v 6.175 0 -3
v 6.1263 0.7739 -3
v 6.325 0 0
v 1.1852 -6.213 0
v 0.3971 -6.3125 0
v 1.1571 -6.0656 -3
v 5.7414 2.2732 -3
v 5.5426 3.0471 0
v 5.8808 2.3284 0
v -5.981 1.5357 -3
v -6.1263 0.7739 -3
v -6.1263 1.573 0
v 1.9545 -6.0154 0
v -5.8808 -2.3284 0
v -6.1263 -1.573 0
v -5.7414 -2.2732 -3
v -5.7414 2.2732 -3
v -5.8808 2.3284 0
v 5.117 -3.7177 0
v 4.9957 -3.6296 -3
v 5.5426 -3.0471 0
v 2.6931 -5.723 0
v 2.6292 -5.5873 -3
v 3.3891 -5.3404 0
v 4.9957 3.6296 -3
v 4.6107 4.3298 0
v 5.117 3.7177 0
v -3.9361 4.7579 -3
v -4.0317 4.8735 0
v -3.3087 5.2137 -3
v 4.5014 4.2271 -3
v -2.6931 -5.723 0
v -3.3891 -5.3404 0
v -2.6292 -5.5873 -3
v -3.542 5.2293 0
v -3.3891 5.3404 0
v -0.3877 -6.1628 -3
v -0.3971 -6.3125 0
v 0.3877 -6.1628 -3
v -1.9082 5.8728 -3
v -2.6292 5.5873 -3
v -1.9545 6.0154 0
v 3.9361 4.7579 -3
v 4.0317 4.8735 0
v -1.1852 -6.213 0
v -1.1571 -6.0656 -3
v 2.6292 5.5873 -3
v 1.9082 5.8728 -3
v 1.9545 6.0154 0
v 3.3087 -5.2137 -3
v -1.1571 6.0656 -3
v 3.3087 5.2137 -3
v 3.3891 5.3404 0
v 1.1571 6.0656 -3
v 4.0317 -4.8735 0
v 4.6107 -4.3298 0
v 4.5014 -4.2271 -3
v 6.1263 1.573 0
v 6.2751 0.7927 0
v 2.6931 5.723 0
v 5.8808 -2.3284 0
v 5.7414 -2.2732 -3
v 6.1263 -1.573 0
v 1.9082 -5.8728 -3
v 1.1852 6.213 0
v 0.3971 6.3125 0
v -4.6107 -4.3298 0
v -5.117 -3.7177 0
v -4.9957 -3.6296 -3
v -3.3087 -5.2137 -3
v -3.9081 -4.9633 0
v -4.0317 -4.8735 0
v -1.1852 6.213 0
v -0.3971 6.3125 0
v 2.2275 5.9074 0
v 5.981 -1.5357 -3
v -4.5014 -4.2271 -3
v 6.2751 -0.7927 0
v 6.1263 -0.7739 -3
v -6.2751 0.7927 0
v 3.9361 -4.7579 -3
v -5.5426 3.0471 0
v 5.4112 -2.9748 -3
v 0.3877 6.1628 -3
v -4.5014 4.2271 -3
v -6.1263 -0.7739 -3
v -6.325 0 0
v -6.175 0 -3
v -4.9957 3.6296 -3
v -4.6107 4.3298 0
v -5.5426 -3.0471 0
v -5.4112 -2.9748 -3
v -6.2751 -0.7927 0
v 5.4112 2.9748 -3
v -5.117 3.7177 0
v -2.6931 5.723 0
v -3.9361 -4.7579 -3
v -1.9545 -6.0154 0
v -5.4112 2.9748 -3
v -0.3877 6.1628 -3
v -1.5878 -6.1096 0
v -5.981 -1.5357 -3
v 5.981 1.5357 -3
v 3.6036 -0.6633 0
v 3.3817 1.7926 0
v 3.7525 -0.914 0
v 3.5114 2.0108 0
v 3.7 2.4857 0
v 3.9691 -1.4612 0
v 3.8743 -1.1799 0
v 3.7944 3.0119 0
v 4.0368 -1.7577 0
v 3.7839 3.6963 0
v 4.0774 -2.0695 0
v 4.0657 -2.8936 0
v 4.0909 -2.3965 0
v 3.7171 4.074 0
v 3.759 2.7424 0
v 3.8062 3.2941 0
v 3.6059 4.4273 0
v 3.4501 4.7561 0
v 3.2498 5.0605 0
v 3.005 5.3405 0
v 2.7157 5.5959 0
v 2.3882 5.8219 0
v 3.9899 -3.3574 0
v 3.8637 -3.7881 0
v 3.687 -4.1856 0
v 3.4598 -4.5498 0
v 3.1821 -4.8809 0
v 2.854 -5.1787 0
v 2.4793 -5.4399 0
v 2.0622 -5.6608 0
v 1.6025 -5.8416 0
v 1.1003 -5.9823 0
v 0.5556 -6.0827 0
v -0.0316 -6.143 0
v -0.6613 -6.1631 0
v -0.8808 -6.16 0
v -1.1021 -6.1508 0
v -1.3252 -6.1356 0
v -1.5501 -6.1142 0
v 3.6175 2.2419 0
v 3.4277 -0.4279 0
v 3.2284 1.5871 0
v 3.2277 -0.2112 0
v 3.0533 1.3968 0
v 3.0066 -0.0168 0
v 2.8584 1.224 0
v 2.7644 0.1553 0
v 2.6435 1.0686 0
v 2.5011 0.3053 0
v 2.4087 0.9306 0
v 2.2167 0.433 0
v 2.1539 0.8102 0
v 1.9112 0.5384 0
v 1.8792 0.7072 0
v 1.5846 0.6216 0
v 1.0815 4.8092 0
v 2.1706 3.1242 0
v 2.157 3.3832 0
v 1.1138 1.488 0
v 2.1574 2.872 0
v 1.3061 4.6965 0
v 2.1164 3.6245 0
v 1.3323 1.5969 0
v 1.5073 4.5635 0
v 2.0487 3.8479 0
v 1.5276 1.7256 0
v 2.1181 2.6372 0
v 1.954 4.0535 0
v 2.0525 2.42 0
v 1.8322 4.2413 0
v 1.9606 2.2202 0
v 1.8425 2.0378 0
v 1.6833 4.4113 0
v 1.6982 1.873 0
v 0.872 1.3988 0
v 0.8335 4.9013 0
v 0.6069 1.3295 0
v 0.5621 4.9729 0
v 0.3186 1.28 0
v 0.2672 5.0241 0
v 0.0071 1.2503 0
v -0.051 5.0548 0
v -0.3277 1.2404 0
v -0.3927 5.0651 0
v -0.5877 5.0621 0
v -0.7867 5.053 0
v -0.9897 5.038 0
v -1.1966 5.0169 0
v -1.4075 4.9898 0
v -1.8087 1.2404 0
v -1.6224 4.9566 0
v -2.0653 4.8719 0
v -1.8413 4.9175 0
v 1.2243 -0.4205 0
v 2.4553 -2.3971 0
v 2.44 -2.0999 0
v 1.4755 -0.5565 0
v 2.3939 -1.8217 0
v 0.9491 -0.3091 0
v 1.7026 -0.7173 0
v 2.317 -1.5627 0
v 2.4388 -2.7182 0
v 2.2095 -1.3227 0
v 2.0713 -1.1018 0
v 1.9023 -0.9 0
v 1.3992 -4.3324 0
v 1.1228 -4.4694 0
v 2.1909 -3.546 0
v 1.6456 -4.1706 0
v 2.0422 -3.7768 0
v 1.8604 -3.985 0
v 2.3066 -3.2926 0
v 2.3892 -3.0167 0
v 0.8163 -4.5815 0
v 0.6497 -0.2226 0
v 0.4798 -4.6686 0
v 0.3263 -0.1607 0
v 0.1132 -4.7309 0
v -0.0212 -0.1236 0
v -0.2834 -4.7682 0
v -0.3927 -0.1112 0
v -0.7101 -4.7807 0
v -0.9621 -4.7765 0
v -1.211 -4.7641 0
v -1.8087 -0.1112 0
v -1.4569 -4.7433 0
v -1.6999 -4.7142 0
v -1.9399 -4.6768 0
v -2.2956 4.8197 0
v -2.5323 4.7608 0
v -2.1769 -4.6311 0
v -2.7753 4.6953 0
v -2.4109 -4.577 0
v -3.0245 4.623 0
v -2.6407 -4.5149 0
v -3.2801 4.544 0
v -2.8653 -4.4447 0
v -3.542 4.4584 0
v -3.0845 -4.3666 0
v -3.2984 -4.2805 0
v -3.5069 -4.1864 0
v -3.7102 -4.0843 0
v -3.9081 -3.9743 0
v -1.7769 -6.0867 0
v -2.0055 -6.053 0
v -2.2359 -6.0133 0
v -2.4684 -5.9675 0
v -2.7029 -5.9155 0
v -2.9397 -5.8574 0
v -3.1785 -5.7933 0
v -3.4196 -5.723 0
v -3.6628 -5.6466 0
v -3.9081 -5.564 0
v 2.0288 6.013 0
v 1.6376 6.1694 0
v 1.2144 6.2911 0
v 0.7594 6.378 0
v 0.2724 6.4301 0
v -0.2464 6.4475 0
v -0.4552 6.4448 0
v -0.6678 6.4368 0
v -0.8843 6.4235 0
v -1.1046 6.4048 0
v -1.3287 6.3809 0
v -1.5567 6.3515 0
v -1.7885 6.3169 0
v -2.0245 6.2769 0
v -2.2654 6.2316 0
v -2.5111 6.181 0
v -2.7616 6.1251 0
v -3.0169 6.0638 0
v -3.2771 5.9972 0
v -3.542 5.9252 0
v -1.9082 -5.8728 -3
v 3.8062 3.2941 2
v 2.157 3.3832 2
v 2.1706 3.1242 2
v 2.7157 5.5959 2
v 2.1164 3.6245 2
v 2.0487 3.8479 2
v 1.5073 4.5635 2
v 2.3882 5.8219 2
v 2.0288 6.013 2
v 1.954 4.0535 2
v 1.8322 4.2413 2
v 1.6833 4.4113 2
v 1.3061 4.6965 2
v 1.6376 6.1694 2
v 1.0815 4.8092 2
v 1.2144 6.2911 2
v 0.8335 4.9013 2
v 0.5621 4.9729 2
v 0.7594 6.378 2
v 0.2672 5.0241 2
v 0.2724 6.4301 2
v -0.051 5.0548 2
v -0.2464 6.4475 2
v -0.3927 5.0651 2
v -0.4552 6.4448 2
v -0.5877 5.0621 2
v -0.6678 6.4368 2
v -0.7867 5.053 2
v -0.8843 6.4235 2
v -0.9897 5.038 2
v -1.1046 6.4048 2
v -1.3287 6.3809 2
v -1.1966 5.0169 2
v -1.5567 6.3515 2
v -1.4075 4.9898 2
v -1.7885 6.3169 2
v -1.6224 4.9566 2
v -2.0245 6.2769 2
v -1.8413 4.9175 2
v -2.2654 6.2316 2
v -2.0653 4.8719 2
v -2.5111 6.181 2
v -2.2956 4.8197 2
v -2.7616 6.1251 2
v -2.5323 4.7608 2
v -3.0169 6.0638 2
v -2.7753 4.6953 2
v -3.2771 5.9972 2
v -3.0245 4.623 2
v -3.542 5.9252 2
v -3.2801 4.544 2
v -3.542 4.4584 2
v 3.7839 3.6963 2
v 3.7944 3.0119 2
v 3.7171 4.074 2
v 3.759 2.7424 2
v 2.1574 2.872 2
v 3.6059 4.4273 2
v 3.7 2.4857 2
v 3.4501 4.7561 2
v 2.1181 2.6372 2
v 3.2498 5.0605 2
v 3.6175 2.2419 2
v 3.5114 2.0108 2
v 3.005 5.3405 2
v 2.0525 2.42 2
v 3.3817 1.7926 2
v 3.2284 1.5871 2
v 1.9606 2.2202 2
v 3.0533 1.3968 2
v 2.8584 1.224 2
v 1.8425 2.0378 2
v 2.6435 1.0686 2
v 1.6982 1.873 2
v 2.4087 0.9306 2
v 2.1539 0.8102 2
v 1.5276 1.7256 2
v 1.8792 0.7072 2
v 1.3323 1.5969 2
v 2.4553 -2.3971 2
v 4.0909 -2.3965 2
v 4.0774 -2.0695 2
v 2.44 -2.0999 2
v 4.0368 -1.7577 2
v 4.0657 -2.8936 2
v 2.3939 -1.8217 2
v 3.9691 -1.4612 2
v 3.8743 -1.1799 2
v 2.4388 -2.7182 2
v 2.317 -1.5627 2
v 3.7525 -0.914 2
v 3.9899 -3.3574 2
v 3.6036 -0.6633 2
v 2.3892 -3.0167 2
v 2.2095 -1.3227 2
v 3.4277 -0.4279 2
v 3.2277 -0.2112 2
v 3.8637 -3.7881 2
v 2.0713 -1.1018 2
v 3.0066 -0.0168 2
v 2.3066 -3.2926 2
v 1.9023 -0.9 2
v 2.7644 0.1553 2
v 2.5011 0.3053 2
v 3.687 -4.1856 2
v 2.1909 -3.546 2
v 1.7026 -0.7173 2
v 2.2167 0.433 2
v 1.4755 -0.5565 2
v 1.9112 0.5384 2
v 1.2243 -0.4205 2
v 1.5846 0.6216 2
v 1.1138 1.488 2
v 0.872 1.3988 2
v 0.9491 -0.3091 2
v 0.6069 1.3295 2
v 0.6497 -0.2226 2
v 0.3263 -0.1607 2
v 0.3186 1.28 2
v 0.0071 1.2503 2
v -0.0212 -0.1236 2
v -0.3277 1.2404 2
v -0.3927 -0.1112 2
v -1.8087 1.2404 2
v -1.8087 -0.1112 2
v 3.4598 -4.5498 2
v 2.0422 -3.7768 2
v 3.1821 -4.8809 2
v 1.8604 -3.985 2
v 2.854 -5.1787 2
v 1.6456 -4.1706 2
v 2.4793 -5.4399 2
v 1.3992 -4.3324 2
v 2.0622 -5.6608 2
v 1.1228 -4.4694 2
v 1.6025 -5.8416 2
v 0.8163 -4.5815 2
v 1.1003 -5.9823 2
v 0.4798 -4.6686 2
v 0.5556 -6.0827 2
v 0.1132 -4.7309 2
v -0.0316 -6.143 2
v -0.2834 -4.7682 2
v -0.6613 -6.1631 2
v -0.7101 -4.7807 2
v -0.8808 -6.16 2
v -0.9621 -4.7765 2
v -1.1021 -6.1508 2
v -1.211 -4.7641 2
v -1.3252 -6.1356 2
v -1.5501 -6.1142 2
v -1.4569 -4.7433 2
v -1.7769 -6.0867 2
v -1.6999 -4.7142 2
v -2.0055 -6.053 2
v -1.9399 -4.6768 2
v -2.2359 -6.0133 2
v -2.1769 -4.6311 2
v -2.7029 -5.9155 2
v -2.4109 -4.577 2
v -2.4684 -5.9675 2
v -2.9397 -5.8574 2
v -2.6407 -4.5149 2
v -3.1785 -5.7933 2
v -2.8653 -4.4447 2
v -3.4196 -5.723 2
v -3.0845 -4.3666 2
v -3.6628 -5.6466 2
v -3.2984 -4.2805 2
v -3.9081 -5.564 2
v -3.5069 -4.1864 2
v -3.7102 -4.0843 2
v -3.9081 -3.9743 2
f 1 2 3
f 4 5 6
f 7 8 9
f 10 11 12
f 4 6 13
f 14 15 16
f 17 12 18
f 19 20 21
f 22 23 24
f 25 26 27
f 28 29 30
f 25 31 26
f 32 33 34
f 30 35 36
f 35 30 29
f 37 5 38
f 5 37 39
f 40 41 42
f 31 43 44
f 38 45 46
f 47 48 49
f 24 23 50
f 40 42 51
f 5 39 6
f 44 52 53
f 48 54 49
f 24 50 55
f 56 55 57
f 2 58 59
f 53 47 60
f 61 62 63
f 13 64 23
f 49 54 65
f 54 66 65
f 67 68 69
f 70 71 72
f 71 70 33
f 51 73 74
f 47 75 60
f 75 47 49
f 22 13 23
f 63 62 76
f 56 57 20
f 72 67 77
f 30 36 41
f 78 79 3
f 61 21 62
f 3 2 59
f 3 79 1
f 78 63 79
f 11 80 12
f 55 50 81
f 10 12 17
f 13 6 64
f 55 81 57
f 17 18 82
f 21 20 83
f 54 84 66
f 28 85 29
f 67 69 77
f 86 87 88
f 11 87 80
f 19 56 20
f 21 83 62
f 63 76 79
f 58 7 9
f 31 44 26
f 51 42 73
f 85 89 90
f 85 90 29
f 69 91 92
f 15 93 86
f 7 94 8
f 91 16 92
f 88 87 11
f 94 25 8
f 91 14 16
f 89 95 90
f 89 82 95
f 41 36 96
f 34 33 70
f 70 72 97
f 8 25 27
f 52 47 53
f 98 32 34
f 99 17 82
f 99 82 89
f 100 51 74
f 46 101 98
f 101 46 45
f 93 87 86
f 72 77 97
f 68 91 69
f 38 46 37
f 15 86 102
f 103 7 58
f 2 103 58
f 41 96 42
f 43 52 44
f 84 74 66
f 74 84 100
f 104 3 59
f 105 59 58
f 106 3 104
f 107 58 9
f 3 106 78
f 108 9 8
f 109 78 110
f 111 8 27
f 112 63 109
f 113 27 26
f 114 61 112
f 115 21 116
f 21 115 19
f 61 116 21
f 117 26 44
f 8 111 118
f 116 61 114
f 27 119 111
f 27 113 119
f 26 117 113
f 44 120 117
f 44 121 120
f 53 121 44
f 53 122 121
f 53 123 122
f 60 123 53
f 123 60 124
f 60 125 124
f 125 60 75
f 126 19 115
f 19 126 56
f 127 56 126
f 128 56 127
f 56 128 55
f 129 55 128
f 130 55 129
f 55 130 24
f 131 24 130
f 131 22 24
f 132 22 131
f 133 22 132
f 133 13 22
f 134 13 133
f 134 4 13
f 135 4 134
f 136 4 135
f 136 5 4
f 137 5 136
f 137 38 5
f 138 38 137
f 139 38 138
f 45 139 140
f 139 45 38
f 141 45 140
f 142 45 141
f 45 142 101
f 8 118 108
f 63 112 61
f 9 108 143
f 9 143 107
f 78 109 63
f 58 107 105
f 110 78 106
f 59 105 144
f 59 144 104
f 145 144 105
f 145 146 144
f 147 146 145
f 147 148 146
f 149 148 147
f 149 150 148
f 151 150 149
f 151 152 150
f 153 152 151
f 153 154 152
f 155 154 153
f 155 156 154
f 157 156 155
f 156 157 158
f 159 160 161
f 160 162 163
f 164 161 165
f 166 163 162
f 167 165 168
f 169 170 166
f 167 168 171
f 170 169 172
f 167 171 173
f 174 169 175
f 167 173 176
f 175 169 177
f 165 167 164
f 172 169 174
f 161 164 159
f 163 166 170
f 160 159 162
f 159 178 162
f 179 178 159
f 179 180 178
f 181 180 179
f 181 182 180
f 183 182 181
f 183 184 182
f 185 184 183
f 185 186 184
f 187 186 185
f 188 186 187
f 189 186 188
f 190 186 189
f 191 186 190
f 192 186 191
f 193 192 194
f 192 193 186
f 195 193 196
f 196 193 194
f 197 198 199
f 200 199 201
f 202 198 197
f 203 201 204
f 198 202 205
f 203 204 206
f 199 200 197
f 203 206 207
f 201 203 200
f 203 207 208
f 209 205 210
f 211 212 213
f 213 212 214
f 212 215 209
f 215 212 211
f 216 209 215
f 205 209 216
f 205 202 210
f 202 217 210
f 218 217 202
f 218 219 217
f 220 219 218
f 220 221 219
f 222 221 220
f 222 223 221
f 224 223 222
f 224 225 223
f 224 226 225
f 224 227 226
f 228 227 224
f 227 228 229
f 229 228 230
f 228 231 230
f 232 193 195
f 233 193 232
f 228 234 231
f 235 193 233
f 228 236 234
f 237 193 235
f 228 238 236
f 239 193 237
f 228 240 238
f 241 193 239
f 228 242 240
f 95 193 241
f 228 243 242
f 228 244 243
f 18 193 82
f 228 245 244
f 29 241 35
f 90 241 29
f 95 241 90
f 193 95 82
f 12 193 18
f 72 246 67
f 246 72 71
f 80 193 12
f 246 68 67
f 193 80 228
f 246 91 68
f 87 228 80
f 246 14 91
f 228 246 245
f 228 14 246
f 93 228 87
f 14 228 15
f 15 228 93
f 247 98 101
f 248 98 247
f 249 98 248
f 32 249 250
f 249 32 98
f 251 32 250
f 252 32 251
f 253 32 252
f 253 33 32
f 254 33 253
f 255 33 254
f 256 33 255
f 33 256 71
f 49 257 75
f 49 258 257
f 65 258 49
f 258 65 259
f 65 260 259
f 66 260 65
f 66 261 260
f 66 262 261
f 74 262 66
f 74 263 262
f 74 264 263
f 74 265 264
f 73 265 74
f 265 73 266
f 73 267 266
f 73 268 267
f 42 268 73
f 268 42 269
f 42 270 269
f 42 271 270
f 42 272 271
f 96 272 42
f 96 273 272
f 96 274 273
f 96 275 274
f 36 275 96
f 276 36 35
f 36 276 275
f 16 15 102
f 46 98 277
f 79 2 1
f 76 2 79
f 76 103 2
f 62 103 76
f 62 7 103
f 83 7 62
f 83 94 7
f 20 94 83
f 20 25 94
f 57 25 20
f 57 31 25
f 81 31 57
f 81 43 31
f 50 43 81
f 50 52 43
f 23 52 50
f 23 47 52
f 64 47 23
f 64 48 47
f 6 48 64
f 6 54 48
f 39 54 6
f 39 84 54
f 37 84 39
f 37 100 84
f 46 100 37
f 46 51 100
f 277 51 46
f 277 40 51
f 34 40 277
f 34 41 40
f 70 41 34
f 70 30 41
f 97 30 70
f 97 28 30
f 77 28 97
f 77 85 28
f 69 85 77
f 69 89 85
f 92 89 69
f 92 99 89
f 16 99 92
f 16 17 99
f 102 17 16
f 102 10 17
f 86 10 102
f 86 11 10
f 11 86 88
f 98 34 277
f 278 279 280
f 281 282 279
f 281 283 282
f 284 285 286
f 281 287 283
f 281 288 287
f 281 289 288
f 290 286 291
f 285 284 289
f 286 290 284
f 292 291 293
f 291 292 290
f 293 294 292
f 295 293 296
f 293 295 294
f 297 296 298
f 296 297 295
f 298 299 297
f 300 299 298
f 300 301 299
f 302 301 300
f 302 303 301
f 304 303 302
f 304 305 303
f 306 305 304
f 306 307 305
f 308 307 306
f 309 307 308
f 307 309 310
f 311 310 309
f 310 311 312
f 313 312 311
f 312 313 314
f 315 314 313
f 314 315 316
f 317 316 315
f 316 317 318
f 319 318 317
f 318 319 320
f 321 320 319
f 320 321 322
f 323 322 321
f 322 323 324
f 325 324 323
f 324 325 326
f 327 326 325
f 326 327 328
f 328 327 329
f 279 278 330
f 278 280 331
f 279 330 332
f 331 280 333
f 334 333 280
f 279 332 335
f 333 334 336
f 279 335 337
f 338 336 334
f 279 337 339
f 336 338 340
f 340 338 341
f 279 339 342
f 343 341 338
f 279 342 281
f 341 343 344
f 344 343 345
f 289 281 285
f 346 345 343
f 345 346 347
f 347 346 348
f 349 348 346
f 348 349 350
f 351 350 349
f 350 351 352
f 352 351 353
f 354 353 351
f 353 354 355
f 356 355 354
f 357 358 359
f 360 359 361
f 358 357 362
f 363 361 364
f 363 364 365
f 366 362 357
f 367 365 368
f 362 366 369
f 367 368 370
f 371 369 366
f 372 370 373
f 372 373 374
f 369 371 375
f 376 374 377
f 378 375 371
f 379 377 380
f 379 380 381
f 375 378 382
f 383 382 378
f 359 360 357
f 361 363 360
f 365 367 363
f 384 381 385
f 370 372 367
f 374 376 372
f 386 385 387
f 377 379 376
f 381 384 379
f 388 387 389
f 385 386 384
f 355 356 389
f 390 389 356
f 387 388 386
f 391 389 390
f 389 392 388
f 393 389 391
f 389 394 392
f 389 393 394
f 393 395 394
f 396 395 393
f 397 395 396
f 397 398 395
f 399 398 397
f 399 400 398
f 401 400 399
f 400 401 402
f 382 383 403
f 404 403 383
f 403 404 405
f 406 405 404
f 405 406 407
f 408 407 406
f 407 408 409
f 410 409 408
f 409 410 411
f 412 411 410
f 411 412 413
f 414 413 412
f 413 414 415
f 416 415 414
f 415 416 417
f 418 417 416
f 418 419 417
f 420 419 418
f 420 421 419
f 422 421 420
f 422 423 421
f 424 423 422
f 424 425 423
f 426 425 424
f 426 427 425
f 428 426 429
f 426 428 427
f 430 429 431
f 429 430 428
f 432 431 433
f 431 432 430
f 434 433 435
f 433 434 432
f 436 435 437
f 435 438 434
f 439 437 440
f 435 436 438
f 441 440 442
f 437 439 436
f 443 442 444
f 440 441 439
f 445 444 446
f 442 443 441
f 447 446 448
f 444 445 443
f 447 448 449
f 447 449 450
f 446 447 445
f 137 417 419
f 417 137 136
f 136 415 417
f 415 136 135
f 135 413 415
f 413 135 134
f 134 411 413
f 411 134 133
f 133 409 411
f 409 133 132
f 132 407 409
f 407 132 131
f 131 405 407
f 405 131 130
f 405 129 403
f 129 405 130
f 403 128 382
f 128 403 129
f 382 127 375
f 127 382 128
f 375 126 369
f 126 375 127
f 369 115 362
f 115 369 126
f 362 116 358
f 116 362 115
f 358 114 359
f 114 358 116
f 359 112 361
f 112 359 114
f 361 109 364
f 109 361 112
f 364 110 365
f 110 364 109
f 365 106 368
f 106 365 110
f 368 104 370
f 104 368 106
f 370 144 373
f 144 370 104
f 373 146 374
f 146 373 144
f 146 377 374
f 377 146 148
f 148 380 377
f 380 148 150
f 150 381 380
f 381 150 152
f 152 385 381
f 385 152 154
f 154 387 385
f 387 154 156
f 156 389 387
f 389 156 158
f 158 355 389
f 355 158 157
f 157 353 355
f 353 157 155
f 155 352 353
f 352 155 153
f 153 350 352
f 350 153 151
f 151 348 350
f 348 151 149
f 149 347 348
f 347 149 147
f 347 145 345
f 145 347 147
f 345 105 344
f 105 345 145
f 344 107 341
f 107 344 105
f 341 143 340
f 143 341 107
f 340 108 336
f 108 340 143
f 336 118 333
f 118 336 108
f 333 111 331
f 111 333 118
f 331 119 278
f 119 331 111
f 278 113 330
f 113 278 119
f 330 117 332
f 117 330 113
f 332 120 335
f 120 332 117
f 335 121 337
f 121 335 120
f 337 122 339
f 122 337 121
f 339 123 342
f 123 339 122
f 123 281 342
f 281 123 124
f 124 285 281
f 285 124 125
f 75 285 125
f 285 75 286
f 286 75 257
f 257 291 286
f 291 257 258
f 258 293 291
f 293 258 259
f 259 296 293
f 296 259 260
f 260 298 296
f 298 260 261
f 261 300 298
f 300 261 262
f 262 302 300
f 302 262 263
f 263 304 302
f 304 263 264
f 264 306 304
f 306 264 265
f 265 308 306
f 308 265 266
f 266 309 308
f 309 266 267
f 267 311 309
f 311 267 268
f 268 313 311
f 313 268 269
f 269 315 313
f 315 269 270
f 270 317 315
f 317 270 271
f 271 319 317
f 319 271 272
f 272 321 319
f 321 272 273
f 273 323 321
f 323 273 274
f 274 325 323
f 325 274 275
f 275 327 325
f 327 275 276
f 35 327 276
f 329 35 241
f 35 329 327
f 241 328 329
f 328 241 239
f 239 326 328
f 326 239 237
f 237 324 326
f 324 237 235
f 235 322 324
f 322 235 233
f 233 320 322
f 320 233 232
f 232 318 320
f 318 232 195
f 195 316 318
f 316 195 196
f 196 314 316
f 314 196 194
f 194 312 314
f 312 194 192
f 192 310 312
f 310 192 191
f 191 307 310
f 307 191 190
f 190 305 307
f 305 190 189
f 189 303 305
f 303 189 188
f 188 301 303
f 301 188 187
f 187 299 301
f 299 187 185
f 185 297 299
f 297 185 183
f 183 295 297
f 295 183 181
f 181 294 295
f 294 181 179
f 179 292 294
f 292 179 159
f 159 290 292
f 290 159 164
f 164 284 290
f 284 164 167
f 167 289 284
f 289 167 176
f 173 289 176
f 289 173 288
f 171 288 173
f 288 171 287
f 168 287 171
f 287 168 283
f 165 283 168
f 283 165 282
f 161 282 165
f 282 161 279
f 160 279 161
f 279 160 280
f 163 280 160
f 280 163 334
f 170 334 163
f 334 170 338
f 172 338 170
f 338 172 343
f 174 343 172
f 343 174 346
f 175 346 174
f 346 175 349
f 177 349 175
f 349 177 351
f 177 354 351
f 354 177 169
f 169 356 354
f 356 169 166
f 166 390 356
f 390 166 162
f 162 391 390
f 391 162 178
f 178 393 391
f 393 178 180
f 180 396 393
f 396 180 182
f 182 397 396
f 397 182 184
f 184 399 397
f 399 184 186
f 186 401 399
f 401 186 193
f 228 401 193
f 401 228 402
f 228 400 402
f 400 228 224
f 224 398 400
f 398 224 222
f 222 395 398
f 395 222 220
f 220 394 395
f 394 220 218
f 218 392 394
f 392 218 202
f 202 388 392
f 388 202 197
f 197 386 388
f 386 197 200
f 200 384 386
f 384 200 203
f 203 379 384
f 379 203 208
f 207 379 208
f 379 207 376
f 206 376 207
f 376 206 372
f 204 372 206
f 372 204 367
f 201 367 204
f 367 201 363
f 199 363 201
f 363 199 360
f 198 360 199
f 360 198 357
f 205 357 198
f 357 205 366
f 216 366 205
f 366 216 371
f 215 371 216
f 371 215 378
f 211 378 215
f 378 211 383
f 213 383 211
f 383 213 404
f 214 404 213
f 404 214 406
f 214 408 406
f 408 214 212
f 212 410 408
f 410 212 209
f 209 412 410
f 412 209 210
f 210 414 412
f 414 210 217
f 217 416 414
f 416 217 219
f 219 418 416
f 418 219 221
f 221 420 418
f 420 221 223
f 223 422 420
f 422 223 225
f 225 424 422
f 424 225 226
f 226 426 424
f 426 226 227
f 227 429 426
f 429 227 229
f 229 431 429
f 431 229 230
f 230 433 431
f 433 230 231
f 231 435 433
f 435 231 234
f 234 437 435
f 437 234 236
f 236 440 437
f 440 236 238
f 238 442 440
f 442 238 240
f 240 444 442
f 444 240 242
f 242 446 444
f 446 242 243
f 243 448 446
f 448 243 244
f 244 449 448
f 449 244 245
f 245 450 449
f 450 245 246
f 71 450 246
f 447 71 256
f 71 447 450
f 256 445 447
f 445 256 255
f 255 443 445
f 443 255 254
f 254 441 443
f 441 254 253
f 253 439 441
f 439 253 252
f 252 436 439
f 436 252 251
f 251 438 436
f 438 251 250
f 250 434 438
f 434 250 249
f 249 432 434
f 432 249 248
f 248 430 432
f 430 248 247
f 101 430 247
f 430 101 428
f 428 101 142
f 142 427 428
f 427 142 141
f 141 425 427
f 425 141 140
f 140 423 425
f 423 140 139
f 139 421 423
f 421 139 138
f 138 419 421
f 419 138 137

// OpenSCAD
$fn = 50;

difference() {
	union() {
		translate(v = [0, 0, -3.0]) {
			cylinder(h = 3, r1 = 6.175, r2 = 6.325);
		}
		linear_extrude(height = 2) {
			text(font = "Impact", halign = "center", size = 12, text = "3", valign = "center");
		}
	}
	union();
}
